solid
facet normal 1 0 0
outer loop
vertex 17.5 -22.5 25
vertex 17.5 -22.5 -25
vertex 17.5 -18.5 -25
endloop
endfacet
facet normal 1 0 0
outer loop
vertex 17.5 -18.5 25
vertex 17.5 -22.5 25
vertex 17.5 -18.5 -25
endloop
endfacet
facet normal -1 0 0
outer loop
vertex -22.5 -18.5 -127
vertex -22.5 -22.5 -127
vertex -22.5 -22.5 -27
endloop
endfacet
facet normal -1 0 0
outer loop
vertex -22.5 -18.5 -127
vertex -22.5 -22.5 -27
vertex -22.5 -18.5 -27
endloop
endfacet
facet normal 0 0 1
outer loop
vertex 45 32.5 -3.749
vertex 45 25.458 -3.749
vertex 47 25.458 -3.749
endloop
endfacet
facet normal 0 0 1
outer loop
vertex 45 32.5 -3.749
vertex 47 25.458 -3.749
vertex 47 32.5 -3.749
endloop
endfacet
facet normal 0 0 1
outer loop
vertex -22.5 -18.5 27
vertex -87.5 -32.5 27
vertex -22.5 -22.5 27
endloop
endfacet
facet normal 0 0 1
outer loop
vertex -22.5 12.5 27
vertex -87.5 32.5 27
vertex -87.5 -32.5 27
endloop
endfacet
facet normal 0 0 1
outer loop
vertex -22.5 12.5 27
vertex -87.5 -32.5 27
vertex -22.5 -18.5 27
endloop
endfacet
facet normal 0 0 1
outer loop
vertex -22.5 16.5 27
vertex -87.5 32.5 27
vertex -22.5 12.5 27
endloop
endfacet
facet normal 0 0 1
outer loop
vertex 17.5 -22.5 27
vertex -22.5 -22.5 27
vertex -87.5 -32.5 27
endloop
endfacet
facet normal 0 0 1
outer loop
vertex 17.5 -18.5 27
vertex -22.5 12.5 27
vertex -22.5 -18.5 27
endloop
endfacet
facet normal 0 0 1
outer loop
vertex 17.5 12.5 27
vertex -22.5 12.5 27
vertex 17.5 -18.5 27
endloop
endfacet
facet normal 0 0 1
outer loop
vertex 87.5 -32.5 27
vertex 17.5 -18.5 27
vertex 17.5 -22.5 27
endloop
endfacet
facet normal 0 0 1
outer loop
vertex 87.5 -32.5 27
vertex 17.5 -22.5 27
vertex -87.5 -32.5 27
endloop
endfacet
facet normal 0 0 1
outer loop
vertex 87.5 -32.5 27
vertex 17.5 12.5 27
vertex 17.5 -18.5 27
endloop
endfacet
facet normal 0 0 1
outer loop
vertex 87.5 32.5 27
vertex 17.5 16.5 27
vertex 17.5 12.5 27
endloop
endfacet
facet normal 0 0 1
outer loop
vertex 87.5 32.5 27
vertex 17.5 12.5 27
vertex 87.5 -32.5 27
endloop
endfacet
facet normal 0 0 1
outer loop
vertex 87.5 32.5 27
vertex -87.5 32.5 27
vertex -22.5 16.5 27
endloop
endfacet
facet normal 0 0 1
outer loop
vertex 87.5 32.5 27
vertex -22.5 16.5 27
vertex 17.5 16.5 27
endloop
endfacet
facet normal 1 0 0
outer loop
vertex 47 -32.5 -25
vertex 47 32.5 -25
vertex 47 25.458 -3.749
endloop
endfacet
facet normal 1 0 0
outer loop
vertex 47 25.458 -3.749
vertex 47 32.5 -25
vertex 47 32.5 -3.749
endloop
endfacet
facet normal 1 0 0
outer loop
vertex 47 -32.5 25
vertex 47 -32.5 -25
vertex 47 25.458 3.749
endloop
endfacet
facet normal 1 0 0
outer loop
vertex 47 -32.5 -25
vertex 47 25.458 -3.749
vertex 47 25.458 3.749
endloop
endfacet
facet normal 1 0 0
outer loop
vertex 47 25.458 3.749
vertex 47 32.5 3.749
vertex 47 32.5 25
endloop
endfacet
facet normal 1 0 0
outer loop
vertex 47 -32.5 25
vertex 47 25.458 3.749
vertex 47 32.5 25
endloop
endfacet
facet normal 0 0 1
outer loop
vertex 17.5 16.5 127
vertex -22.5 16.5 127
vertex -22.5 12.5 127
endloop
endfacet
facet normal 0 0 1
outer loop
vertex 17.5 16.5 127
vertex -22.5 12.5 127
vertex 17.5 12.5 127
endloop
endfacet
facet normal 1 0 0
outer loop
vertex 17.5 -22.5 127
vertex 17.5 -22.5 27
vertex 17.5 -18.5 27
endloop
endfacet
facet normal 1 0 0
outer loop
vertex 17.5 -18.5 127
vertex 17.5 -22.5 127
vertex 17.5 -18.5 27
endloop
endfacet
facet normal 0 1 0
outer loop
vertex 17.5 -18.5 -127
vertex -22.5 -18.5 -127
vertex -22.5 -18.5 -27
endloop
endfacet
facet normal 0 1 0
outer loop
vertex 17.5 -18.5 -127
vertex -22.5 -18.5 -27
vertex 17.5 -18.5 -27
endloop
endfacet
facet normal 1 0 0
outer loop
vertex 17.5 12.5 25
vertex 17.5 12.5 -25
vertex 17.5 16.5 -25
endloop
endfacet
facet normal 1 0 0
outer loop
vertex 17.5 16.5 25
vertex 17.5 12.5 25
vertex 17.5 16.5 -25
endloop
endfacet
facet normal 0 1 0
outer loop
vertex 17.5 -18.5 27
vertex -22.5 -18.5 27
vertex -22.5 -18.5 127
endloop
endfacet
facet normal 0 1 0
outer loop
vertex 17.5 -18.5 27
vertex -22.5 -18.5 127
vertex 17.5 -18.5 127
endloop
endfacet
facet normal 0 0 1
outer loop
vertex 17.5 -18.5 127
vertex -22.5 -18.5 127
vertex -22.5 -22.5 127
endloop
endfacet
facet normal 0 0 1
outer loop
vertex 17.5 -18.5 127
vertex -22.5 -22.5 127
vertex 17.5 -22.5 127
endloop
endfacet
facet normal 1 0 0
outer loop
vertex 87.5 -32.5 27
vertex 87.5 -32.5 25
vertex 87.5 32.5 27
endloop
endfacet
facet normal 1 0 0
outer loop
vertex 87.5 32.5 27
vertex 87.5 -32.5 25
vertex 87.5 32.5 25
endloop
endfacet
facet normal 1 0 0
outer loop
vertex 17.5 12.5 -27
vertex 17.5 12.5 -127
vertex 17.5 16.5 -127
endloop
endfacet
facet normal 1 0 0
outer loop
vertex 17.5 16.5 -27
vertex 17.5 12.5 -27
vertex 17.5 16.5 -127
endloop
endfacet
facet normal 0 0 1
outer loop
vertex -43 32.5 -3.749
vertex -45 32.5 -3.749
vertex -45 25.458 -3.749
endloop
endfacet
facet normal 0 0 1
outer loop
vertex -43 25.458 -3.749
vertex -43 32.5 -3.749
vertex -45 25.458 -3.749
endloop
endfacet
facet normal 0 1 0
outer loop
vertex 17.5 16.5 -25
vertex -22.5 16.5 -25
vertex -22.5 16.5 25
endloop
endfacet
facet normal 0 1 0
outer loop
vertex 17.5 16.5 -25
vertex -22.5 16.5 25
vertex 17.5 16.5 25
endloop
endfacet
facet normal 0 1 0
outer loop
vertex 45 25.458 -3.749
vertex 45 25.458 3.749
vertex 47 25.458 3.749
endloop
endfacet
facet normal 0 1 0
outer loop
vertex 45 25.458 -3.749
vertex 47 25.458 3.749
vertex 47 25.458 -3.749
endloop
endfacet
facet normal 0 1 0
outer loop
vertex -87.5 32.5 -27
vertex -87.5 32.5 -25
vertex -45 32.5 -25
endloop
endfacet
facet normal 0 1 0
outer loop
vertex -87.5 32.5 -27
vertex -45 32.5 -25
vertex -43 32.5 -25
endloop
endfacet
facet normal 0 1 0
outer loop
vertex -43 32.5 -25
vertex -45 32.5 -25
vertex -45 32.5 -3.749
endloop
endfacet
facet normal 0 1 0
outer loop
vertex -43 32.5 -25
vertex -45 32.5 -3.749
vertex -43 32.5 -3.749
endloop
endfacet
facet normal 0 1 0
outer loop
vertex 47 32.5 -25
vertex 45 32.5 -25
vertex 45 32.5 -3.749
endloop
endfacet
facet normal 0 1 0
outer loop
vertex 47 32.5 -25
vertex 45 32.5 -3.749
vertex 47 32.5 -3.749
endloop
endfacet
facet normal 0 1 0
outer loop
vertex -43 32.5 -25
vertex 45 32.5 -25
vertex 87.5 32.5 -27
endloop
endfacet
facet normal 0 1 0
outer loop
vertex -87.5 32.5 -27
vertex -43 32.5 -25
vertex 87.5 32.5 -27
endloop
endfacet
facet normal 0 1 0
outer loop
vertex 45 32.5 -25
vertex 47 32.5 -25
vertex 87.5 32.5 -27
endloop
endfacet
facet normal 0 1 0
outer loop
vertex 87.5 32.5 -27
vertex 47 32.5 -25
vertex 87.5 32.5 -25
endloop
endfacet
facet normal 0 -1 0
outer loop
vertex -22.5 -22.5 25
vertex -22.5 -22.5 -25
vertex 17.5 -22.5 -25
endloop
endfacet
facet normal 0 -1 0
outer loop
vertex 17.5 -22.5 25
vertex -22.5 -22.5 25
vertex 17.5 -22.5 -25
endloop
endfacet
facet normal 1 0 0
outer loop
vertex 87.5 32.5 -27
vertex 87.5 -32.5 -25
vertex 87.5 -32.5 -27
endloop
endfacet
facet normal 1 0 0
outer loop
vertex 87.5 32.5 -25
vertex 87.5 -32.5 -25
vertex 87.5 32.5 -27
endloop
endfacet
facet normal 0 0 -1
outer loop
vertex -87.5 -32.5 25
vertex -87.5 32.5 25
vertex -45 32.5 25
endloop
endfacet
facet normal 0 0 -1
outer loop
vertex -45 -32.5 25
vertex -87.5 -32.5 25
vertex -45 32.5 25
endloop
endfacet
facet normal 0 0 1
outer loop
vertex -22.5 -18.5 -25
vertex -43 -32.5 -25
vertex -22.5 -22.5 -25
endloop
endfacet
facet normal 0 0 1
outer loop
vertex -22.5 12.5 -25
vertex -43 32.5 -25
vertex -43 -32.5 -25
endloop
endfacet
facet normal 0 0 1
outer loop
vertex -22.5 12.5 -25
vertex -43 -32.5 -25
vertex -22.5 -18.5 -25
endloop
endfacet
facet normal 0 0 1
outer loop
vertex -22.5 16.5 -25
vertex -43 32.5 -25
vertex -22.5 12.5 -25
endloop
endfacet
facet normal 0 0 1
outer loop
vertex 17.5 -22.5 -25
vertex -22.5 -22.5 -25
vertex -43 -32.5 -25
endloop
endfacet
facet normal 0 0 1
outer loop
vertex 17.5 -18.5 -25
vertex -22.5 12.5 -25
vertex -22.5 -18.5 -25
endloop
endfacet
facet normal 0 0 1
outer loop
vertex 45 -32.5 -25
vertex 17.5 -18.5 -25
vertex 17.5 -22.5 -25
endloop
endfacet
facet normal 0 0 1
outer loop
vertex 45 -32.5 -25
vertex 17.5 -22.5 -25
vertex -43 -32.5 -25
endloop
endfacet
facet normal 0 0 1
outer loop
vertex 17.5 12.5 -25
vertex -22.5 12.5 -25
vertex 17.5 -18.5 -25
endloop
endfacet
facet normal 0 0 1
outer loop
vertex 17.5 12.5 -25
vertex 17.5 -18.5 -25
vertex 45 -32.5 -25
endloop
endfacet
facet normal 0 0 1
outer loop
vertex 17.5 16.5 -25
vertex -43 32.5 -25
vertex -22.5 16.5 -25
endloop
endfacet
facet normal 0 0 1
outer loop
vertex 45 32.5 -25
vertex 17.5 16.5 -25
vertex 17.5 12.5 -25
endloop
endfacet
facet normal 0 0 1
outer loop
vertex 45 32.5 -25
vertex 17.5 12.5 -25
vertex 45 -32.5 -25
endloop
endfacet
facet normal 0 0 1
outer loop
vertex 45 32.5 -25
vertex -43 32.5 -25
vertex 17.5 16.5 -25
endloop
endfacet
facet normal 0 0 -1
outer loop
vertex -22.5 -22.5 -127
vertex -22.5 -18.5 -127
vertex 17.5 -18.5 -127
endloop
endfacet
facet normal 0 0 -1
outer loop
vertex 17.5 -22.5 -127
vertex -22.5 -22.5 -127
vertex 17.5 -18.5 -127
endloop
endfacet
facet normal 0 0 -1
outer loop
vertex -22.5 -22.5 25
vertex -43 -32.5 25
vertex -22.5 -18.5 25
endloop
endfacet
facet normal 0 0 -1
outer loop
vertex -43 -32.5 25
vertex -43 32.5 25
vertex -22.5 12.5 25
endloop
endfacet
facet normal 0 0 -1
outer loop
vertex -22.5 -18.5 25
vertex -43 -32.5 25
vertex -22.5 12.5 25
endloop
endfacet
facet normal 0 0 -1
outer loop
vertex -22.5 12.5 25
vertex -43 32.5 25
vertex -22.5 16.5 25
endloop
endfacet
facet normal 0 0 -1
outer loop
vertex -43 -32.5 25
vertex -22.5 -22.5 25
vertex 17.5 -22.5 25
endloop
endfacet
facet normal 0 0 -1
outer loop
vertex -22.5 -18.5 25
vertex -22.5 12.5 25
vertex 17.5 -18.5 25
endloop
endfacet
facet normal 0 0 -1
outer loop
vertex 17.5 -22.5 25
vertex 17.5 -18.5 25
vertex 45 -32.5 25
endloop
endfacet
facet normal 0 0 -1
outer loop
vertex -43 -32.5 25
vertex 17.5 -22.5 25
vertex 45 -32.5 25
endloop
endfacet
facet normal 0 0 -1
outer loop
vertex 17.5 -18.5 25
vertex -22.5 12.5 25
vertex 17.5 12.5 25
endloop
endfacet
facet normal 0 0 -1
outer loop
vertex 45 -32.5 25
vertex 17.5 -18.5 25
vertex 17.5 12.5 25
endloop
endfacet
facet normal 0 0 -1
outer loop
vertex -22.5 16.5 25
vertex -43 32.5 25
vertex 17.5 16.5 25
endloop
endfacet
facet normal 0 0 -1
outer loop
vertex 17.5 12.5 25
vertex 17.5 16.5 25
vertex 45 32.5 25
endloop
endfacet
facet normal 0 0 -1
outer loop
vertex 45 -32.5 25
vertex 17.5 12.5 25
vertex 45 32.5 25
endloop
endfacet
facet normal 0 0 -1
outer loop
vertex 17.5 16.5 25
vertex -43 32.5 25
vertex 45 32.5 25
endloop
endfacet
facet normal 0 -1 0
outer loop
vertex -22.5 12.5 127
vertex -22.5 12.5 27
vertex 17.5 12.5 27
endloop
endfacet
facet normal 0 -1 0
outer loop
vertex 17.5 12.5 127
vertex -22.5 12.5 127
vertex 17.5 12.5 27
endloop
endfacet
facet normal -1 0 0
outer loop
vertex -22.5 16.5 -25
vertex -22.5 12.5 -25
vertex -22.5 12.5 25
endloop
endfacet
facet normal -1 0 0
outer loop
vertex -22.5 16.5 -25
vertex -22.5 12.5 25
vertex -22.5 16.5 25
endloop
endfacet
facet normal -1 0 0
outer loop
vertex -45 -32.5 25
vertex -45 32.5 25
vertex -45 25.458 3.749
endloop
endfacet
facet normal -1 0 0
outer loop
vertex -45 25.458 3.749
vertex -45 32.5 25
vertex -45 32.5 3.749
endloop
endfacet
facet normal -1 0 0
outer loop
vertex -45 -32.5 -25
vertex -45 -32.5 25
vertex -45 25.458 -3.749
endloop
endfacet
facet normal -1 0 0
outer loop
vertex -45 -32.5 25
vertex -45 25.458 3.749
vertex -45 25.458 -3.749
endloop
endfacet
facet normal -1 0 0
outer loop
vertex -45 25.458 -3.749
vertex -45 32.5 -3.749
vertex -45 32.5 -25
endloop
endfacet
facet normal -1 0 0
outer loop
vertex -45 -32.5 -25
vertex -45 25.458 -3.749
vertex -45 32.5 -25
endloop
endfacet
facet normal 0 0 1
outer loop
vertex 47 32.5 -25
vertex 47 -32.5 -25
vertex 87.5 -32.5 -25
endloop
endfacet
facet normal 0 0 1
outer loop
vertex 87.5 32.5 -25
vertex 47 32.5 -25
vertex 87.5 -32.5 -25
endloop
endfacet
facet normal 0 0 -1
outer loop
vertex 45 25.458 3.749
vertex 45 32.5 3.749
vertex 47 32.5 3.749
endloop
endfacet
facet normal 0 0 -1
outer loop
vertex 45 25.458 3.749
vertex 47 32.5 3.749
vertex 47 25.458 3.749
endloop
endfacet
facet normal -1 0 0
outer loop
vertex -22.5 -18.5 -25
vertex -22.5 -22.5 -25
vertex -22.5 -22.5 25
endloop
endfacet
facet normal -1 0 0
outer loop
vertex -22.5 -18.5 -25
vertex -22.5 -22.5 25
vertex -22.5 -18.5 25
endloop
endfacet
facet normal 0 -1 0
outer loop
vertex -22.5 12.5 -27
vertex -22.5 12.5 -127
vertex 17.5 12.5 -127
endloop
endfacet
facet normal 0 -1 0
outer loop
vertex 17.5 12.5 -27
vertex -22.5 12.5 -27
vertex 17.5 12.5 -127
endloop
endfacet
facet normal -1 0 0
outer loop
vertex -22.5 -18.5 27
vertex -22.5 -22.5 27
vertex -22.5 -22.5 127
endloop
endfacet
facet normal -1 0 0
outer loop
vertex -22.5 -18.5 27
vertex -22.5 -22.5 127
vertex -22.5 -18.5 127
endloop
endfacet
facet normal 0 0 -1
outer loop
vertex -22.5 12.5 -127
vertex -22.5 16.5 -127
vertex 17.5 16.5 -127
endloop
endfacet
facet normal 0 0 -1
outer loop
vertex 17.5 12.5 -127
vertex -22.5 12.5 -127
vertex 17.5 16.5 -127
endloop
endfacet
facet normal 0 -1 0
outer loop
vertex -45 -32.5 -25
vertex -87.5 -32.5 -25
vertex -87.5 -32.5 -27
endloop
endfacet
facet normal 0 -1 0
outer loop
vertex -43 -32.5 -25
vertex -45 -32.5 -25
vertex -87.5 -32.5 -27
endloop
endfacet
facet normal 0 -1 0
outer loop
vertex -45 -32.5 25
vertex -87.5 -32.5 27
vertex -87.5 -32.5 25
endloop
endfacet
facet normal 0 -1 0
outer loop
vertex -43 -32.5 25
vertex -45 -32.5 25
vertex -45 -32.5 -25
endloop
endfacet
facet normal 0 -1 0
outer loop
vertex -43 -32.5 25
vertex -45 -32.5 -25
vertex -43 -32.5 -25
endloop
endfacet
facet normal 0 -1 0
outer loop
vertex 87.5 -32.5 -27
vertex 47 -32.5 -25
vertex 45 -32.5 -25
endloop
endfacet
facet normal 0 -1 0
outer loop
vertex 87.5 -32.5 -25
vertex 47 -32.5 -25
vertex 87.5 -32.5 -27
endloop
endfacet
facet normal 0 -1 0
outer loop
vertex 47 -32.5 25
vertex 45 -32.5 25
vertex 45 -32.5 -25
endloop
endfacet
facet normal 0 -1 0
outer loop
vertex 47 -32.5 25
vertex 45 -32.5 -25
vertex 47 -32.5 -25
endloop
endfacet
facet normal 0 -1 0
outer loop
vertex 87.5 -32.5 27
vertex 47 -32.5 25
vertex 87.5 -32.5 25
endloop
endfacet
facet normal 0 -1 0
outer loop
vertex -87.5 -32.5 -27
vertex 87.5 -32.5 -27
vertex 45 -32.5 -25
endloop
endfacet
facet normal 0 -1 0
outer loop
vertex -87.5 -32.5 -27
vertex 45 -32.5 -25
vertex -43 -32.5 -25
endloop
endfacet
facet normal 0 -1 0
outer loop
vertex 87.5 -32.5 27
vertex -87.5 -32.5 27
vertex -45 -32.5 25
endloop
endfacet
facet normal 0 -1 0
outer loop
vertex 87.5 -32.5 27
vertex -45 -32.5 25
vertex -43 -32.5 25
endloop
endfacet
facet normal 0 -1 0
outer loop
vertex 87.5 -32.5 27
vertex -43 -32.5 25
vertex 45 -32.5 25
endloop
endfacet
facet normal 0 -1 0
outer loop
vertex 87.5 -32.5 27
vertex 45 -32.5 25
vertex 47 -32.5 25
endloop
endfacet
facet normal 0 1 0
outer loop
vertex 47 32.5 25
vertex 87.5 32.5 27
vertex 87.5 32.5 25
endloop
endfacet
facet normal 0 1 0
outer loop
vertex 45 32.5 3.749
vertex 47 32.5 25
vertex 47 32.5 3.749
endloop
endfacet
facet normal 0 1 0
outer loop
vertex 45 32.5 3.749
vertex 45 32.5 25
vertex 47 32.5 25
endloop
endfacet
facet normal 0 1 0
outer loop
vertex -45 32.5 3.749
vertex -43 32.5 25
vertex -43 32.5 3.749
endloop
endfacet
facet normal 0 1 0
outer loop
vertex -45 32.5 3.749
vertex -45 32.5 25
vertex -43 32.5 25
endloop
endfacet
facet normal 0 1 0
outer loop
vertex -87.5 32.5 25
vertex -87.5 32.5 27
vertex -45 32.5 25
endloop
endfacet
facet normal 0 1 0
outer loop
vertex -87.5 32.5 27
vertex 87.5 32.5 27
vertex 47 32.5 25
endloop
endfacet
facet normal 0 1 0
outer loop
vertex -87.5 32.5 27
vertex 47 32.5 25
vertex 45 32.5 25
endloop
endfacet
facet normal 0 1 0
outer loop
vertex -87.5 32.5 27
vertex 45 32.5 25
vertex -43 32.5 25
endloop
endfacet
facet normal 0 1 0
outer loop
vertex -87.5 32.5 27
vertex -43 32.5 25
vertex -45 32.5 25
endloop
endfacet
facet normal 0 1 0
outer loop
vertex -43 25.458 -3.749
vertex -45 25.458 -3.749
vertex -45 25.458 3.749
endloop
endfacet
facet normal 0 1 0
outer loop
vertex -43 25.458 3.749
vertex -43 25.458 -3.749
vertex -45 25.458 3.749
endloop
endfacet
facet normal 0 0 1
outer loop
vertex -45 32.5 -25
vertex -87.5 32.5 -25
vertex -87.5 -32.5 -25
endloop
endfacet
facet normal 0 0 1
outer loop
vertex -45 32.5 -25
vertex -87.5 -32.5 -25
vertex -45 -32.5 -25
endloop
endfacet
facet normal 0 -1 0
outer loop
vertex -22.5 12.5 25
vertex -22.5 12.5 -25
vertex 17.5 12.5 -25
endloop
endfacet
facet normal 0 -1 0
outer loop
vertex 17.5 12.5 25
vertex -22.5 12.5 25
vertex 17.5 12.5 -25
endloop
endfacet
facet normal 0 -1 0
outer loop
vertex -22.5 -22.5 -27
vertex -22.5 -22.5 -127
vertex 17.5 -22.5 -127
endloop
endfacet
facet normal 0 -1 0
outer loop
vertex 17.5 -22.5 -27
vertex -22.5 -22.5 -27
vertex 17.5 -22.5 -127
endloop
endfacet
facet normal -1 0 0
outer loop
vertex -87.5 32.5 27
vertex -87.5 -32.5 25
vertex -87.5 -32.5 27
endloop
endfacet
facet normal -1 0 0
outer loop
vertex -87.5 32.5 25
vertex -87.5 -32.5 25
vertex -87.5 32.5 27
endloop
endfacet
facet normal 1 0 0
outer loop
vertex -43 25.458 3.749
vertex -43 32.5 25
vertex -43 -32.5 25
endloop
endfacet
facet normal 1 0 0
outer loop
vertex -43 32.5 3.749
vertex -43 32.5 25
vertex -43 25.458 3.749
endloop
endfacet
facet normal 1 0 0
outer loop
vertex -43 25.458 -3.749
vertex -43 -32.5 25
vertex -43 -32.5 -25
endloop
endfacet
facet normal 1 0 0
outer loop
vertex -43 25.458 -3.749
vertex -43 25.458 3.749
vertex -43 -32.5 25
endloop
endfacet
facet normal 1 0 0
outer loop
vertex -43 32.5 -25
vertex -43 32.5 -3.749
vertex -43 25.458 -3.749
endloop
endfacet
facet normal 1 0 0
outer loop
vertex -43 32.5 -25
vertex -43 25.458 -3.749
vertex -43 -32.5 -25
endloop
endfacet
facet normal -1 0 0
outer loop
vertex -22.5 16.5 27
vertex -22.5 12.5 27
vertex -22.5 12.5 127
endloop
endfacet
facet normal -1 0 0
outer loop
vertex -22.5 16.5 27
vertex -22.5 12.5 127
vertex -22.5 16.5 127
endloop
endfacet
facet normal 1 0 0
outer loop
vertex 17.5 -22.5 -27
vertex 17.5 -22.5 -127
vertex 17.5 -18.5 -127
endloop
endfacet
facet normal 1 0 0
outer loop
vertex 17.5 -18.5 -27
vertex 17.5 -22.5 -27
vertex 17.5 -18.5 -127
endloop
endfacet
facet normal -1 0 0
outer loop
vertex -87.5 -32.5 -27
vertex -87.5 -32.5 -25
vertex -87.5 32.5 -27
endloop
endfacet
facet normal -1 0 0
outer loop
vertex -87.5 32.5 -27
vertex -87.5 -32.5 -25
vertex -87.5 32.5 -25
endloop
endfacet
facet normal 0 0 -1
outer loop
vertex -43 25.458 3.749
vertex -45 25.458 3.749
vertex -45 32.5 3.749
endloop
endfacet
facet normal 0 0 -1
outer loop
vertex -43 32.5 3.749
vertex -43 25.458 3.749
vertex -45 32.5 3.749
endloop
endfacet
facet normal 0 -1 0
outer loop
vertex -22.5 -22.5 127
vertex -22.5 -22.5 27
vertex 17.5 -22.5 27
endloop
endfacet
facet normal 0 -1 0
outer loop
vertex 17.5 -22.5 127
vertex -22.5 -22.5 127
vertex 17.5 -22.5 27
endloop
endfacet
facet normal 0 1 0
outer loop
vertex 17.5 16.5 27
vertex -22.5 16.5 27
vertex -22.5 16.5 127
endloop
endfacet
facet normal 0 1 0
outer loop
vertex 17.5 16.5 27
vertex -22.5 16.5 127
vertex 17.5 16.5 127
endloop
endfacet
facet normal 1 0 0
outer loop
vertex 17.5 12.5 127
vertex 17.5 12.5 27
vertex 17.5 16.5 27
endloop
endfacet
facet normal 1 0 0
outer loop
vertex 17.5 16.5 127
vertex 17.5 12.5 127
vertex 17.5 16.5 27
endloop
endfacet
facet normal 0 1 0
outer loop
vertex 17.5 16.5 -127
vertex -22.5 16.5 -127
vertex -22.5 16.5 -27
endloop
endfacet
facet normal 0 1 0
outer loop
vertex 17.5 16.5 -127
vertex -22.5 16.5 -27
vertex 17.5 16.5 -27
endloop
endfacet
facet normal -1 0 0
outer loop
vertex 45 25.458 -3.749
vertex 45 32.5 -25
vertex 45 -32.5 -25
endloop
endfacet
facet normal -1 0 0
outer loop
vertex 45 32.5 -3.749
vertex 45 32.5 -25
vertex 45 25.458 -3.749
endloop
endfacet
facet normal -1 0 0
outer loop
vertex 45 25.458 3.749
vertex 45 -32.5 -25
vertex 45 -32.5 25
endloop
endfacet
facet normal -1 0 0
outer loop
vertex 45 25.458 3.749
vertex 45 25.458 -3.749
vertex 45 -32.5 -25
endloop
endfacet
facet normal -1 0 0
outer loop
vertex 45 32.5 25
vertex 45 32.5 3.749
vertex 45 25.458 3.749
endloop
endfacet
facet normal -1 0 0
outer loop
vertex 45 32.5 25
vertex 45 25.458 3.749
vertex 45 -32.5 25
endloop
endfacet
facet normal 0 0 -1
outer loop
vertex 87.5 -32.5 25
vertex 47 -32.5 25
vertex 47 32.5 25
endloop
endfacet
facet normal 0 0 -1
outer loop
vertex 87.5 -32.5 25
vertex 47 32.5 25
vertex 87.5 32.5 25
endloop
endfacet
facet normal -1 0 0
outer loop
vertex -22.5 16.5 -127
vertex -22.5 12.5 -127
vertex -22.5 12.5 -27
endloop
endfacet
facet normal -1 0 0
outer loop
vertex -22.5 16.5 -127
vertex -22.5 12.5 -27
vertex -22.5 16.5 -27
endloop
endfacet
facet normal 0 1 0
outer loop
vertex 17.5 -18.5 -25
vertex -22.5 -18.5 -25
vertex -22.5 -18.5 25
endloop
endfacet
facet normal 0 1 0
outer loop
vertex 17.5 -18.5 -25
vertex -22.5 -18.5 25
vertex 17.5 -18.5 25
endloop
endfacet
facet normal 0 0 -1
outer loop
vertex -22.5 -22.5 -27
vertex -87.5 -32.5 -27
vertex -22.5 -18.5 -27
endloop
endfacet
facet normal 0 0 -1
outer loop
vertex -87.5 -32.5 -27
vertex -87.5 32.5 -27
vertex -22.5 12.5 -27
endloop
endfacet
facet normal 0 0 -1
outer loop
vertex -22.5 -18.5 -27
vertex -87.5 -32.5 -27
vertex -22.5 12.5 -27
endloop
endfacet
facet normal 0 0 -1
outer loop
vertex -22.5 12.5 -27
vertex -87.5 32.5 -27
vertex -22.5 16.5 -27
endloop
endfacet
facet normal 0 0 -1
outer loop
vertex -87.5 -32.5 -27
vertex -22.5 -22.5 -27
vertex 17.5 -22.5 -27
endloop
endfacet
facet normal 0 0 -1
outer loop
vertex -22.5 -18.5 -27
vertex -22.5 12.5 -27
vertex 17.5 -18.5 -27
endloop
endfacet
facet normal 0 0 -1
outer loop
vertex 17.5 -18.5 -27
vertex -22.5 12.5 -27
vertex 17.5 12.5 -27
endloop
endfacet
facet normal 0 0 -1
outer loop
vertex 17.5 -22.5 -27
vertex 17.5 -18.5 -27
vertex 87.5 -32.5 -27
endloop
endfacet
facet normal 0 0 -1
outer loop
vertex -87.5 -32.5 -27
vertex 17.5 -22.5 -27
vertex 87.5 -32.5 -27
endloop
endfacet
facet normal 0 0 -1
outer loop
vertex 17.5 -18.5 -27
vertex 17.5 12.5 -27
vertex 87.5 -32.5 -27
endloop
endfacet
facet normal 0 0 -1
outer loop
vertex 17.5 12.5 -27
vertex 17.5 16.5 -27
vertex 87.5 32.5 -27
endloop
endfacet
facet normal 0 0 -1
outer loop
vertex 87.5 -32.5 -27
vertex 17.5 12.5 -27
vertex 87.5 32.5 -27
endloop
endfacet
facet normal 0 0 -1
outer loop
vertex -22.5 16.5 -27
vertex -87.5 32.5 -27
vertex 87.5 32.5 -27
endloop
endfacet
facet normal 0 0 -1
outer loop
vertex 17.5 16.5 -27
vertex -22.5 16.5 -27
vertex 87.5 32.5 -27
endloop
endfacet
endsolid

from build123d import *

# Parameters (mm, degrees)
SKETCH1_W                = 175
SKETCH1_H                = 65
BOSS_EXTRUDE1_DEPTH      = 2
SKETCH2_W                = 175
SKETCH2_H                = 65
BOSS_EXTRUDE2_DEPTH      = 2
BOSS_EXTRUDE3_DEPTH      = 127
BOSS_EXTRUDE3_DEPTH_BACK = 127
SKETCH3_W                = 40
SKETCH3_H                = 4
BOSS_EXTRUDE4_DEPTH      = 2
BOSS_EXTRUDE5_DEPTH      = 2


with BuildPart() as part:
    # Sketch1 → Boss-Extrude1 (new body)
    with BuildSketch(Plane.XY.offset(25.0000008)):
        Rectangle(SKETCH1_W, SKETCH1_H)
    extrude(amount=BOSS_EXTRUDE1_DEPTH)



with BuildPart() as body_2:
    # Sketch2 → Boss-Extrude2 (new body)
    with BuildSketch(Plane.XY.offset(-25)):
        Rectangle(SKETCH2_W, SKETCH2_H)
    extrude(amount=-BOSS_EXTRUDE2_DEPTH)


with BuildPart() as part_1:
    add(part.part)

    add(body_2.part)  # Boss-Extrude3 merges body 2
    # Sketch3 → Boss-Extrude3 (add, two sides: drawn at the far end of the back side and taken through both)
    with BuildSketch(Plane.XY.offset(-BOSS_EXTRUDE3_DEPTH_BACK)):
        with Locations((-2.5, 14.5)):
            Rectangle(SKETCH3_W, SKETCH3_H)
        with Locations((-2.5, -20.5)):
            Rectangle(SKETCH3_W, SKETCH3_H)
    extrude(amount=BOSS_EXTRUDE3_DEPTH + BOSS_EXTRUDE3_DEPTH_BACK)

    # Sketch4 → Boss-Extrude4 (add)
    with BuildSketch(Plane(origin=(45.00000144, 0, 0), x_dir=(0, 0, -1), z_dir=(1, 0, 0))):
        Polygon((3.748957701, 32.5), (25, 32.5), (25, -32.5), (-25.0000008, -32.5), (-25.0000008, 32.5), (-3.748958501, 32.5), (-3.748958501, 25.45800753), (3.748957701, 25.45800753), align=None)
    extrude(amount=BOSS_EXTRUDE4_DEPTH)

    # Sketch5 → Boss-Extrude5 (add)
    with BuildSketch(Plane(origin=(-45.00000144, 0, 0), x_dir=(0, 0, -1), z_dir=(1, 0, 0))):
        Polygon((-25.0000008, 32.5), (-25.0000008, -32.5), (25, -32.5), (25, 32.5), (3.748957701, 32.5), (3.748957701, 25.45800753), (-3.748958501, 25.45800753), (-3.748958501, 32.5), align=None)
    extrude(amount=BOSS_EXTRUDE5_DEPTH)


solid = part_1.part
